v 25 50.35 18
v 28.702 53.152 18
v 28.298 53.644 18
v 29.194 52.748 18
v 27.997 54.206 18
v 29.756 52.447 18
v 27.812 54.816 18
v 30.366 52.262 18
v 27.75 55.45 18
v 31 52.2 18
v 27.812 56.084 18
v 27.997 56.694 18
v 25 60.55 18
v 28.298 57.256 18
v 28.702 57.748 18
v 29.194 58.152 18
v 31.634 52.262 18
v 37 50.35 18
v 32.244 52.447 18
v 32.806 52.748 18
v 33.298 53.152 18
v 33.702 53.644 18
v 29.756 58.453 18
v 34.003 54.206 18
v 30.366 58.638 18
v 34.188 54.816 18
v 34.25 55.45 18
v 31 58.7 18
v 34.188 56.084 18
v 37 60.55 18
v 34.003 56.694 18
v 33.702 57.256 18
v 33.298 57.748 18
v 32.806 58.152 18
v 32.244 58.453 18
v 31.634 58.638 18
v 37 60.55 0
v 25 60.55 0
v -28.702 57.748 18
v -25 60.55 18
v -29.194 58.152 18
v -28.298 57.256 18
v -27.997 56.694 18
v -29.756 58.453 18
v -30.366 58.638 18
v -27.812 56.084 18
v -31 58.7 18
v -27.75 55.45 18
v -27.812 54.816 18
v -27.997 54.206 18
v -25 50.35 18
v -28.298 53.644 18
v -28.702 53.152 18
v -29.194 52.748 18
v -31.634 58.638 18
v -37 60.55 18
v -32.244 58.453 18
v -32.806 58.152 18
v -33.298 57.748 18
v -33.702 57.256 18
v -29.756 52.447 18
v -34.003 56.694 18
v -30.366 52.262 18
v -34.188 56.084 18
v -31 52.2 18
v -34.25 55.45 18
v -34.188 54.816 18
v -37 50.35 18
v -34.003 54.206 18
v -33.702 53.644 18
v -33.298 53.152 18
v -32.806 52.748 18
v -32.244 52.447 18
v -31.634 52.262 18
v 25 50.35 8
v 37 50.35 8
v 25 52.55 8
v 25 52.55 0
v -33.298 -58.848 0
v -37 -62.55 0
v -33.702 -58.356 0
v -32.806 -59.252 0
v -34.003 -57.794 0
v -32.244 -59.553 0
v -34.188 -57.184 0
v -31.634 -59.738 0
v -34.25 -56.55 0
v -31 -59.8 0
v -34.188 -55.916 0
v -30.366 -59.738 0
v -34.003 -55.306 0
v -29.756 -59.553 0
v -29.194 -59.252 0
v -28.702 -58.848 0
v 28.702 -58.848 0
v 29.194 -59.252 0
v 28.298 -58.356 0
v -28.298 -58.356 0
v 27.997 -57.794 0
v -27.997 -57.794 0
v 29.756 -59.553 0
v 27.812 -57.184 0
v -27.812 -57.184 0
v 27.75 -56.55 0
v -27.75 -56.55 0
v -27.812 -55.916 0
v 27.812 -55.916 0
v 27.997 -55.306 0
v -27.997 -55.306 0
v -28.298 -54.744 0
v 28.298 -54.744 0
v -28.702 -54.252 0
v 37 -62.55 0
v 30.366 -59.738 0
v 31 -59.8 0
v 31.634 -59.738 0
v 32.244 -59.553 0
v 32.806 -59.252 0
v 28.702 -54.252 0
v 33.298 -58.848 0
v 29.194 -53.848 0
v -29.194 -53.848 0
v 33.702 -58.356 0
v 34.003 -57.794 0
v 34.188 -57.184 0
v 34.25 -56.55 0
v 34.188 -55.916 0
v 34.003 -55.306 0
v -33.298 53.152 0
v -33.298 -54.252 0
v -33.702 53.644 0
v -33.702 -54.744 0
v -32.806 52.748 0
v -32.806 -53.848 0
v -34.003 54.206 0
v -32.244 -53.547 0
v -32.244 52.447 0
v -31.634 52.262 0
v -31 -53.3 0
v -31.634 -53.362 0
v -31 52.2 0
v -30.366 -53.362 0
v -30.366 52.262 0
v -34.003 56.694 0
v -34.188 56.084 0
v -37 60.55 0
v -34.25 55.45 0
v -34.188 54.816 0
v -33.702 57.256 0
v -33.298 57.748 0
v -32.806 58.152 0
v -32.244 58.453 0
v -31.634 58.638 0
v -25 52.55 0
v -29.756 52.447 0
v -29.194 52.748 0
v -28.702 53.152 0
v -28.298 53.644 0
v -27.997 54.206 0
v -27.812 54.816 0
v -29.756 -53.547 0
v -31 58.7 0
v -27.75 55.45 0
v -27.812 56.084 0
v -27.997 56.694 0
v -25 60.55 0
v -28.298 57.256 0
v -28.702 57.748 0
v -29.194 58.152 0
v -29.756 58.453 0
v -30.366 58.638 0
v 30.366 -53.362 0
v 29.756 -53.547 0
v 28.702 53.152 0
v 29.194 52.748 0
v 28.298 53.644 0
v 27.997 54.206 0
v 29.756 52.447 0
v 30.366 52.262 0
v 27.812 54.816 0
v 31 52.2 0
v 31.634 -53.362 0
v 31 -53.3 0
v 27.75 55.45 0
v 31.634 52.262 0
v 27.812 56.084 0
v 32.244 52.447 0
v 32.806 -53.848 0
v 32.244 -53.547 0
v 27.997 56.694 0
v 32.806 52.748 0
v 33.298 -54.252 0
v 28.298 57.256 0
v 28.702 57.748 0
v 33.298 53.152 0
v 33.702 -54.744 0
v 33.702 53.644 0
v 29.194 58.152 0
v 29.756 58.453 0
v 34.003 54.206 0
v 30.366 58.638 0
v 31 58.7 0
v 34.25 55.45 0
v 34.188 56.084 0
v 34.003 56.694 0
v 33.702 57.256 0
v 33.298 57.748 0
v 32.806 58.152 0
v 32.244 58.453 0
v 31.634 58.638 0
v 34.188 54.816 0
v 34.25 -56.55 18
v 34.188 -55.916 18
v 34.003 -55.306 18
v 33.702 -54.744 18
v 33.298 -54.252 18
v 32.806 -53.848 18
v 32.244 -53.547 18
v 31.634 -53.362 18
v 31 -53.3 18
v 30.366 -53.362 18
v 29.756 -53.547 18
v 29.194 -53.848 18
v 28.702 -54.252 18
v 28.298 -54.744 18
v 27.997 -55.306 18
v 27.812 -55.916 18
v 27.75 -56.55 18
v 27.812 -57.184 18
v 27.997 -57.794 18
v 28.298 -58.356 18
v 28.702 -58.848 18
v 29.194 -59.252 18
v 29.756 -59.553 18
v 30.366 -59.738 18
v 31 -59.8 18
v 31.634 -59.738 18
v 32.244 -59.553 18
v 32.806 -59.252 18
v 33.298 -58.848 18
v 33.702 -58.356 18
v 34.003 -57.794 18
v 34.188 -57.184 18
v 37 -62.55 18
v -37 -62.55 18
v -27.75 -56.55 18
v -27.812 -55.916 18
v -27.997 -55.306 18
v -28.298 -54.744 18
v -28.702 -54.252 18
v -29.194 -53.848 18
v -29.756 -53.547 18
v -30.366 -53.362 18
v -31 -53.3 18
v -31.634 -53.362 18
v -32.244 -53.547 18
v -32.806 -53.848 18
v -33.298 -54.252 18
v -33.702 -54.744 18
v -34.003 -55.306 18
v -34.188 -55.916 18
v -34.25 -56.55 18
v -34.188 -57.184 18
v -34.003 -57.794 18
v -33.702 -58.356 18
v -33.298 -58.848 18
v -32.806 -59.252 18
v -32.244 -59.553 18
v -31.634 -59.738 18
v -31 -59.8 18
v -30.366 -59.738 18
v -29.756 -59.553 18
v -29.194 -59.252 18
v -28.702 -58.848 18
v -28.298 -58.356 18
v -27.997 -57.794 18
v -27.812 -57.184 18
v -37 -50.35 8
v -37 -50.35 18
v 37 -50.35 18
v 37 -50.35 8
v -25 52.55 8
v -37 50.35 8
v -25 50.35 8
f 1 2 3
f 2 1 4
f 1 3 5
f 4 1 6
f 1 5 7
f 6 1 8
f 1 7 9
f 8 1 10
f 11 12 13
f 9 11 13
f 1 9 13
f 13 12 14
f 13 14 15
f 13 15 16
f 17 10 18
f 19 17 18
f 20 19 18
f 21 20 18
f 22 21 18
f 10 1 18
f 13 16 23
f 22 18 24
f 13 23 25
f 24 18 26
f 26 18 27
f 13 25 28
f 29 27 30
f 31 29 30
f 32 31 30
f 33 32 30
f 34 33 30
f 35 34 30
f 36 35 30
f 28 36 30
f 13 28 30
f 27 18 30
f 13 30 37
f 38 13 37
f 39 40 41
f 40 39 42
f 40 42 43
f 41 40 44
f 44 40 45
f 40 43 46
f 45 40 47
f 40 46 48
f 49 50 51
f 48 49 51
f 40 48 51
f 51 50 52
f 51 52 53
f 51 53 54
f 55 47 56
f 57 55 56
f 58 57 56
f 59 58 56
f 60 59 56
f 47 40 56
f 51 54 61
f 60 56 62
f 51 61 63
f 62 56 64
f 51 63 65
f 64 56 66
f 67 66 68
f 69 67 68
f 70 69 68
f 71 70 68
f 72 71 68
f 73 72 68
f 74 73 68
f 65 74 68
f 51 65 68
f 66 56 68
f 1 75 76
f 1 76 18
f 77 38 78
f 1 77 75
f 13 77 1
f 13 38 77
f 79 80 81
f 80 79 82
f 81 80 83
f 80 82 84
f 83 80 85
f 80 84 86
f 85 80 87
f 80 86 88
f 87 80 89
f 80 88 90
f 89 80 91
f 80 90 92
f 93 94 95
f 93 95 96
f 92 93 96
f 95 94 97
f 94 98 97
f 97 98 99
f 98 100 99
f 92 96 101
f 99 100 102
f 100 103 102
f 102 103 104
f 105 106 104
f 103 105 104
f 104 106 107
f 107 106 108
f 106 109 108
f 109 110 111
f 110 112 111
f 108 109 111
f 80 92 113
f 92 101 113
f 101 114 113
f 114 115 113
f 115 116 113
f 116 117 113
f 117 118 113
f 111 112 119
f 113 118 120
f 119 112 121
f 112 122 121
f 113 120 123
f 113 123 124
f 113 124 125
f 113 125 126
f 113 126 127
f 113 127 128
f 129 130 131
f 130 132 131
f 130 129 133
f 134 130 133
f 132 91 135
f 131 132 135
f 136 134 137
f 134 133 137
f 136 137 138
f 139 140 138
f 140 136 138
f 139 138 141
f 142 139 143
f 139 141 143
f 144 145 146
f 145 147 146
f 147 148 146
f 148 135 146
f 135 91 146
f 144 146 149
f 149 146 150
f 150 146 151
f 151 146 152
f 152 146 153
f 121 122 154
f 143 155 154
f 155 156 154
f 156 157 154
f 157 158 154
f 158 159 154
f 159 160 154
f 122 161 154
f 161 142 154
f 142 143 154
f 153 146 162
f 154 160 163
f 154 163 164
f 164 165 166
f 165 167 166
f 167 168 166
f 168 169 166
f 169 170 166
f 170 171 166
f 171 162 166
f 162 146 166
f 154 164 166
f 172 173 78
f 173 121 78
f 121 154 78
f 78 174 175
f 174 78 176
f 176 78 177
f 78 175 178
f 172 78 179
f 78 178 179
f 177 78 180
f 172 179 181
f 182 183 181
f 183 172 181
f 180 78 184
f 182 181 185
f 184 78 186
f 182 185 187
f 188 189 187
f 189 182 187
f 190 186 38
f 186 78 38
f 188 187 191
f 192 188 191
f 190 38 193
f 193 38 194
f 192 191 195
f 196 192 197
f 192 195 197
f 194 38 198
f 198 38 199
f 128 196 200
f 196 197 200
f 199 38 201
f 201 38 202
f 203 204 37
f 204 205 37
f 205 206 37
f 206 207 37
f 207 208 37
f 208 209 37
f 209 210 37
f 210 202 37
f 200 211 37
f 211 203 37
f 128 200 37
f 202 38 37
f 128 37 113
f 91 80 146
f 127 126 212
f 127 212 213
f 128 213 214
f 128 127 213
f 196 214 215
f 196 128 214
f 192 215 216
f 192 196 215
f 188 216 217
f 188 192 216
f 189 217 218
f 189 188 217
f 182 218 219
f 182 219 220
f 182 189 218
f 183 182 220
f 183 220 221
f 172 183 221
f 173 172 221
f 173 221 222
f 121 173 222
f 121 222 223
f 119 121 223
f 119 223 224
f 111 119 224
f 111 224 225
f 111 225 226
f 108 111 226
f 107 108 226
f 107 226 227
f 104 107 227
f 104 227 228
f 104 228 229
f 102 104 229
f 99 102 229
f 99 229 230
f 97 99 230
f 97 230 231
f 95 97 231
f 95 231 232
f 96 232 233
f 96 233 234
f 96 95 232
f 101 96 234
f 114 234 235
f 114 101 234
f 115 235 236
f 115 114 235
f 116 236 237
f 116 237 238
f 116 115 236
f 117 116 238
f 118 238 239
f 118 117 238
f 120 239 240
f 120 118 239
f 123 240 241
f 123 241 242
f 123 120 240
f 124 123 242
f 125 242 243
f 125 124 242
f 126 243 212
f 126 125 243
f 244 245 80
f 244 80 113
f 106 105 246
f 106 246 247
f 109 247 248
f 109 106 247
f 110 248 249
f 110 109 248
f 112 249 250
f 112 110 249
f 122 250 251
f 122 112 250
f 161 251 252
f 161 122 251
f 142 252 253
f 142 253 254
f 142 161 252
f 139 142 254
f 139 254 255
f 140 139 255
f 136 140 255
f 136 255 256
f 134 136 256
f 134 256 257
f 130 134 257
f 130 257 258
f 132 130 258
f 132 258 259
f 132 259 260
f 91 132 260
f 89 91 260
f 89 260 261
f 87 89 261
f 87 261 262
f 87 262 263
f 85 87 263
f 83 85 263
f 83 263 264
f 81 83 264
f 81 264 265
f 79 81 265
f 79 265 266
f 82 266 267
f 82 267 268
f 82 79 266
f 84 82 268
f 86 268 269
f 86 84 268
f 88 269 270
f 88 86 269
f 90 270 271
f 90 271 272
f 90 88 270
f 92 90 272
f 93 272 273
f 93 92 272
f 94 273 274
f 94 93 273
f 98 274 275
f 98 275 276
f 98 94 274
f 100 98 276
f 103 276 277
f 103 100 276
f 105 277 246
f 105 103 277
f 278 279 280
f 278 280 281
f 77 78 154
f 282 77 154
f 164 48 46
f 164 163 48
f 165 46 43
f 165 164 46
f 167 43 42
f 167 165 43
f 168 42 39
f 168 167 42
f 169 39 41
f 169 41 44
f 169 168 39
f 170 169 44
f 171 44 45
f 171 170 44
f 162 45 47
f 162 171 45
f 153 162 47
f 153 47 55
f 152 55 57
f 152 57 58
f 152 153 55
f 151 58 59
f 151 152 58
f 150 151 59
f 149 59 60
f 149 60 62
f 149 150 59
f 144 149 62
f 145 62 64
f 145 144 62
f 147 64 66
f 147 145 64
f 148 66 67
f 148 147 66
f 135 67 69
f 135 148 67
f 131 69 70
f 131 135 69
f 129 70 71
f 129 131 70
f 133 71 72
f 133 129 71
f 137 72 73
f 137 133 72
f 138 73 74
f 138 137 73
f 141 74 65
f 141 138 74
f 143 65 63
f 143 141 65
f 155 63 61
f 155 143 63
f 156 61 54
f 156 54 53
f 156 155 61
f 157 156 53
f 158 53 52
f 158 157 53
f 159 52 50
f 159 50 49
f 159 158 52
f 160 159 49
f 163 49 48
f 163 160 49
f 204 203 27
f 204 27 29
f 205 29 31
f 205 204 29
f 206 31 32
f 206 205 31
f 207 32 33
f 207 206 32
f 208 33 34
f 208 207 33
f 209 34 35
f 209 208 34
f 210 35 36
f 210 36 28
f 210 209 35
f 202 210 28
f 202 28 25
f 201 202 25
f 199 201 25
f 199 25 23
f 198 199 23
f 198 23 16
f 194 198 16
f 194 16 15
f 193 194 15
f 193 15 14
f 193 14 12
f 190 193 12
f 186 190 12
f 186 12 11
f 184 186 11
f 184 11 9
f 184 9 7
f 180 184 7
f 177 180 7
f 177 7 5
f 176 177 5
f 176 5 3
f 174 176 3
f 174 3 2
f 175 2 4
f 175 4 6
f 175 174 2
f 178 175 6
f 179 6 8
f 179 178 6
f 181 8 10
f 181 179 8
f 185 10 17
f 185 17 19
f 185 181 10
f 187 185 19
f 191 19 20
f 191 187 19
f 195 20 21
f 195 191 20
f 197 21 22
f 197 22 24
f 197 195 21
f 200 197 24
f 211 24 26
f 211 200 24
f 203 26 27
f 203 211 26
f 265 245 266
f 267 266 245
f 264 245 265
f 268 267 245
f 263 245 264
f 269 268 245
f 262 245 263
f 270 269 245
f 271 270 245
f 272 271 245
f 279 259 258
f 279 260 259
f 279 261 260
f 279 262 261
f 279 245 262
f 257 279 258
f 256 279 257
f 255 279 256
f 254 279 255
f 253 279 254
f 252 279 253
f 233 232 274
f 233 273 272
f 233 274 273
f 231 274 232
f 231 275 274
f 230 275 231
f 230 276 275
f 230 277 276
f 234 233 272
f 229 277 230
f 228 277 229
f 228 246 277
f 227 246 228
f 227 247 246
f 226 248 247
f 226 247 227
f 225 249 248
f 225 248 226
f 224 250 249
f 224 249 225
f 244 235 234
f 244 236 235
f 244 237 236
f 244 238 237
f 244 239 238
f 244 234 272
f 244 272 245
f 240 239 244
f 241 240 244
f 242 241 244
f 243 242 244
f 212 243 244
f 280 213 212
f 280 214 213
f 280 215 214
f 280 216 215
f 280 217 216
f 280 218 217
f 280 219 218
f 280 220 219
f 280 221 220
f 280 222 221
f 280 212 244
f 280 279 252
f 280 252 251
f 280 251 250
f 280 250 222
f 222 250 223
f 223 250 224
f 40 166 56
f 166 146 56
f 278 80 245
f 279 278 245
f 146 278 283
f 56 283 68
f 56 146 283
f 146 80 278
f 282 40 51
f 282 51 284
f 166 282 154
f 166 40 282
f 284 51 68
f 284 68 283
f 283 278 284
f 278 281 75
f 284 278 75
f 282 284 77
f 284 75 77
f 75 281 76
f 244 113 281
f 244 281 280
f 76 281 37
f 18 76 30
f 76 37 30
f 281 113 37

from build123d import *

# Parameters (mm, degrees)
SKETCH1_R           = 3.25
BOSS_EXTRUDE1_DEPTH = 8
SKETCH4_R           = 3.25
BOSS_EXTRUDE3_DEPTH = 10
BOSS_EXTRUDE4_DEPTH = 54
BOSS_EXTRUDE5_DEPTH = 2
BOSS_EXTRUDE6_DEPTH = 2
BOSS_EXTRUDE7_DEPTH = 2
BOSS_EXTRUDE8_DEPTH = 2
SKETCH10_W          = 74
SKETCH10_H          = 18
BOSS_EXTRUDE9_DEPTH = 2


with BuildPart() as part:
    # Sketch1 → Boss-Extrude1 (new body)
    with BuildSketch(Plane.XY):
        Polygon((-27, 52.55), (-27, 60.55), (-35, 60.55), (-35, -60.55), (-27, -60.55), (-27, -52.55), (27, -52.55), (27, -60.55), (35, -60.55), (35, 60.55), (27, 60.55), (27, 52.55), align=None)
        with Locations((31, 55.45)):
            Circle(SKETCH1_R, mode=Mode.SUBTRACT)
        with Locations((-31, 55.45)):
            Circle(SKETCH1_R, mode=Mode.SUBTRACT)
        with Locations((-31, -56.55)):
            Circle(SKETCH1_R, mode=Mode.SUBTRACT)
        with Locations((31, -56.55)):
            Circle(SKETCH1_R, mode=Mode.SUBTRACT)
    extrude(amount=BOSS_EXTRUDE1_DEPTH)

    # Sketch4 → Boss-Extrude3 (add)
    # profile 1 of 4: a face of its own
    with BuildSketch(Plane.XY.offset(8)):
        Polygon((-27, 60.55), (-35, 60.55), (-35, 50.35), (-27, 50.35), (-27, 52.55), align=None)
        with Locations((-31, 55.45)):
            Circle(SKETCH4_R, mode=Mode.SUBTRACT)
    # profile 2 of 4: a face of its own
    with BuildSketch(Plane.XY.offset(8)):
        Polygon((35, 50.35), (35, 60.55), (27, 60.55), (27, 52.55), (27, 50.35), align=None)
        with Locations((31, 55.45)):
            Circle(SKETCH4_R, mode=Mode.SUBTRACT)
    # profile 3 of 4: a face of its own
    with BuildSketch(Plane.XY.offset(8)):
        Polygon((35, -60.55), (35, -50.35), (27, -50.35), (27, -52.55), (27, -60.55), align=None)
        with Locations((31, -56.55)):
            Circle(SKETCH4_R, mode=Mode.SUBTRACT)
    # profile 4 of 4: a face of its own
    with BuildSketch(Plane.XY.offset(8)):
        Polygon((-27, -50.35), (-35, -50.35), (-35, -60.55), (-27, -60.55), (-27, -52.55), align=None)
        with Locations((-31, -56.55)):
            Circle(SKETCH4_R, mode=Mode.SUBTRACT)
    extrude(amount=BOSS_EXTRUDE3_DEPTH)

    # Sketch5 → Boss-Extrude4 (add)
    with BuildSketch(Plane(origin=(-27, 0, 0), x_dir=(0, 0, -1), z_dir=(1, 0, 0))):
        Polygon((-18, -50.35), (-8, -50.35), (-8, -52.55), (0, -52.55), (0, -60.55), (-18, -60.55), align=None)
    extrude(amount=BOSS_EXTRUDE4_DEPTH)

    # Sketch6 → Boss-Extrude5 (add)
    with BuildSketch(Plane(origin=(35, 0, 0), x_dir=(0, 0, -1), z_dir=(1, 0, 0))):
        Polygon((0, -60.55), (0, 60.55), (-18, 60.55), (-18, 50.35), (-8, 50.35), (-8, -50.35), (-18, -50.35), (-18, -60.55), align=None)
    extrude(amount=BOSS_EXTRUDE5_DEPTH)

    # Sketch7 → Boss-Extrude6 (add)
    with BuildSketch(Plane.ZY.offset(-27)):
        Polygon((0, 60.55), (0, 52.55), (8, 52.55), (8, 50.35), (18, 50.35), (18, 60.55), align=None)
    extrude(amount=BOSS_EXTRUDE6_DEPTH)

    # Sketch8 → Boss-Extrude7 (add)
    with BuildSketch(Plane.ZY.offset(35)):
        Polygon((0, 60.55), (0, -60.55), (18, -60.55), (18, -50.35), (8, -50.35), (8, 50.35), (18, 50.35), (18, 60.55), align=None)
    extrude(amount=BOSS_EXTRUDE7_DEPTH)

    # Sketch9 → Boss-Extrude8 (add)
    with BuildSketch(Plane(origin=(-27, 0, 0), x_dir=(0, 0, -1), z_dir=(1, 0, 0))):
        Polygon((0, 52.55), (0, 60.55), (-18, 60.55), (-18, 50.35), (-8, 50.35), (-8, 52.55), align=None)
    extrude(amount=BOSS_EXTRUDE8_DEPTH)

    # Sketch10 → Boss-Extrude9 (add)
    with BuildSketch(Plane.XZ.offset(60.55)):
        with Locations((0, 9)):
            Rectangle(SKETCH10_W, SKETCH10_H)
    extrude(amount=BOSS_EXTRUDE9_DEPTH)


solid = part.part
